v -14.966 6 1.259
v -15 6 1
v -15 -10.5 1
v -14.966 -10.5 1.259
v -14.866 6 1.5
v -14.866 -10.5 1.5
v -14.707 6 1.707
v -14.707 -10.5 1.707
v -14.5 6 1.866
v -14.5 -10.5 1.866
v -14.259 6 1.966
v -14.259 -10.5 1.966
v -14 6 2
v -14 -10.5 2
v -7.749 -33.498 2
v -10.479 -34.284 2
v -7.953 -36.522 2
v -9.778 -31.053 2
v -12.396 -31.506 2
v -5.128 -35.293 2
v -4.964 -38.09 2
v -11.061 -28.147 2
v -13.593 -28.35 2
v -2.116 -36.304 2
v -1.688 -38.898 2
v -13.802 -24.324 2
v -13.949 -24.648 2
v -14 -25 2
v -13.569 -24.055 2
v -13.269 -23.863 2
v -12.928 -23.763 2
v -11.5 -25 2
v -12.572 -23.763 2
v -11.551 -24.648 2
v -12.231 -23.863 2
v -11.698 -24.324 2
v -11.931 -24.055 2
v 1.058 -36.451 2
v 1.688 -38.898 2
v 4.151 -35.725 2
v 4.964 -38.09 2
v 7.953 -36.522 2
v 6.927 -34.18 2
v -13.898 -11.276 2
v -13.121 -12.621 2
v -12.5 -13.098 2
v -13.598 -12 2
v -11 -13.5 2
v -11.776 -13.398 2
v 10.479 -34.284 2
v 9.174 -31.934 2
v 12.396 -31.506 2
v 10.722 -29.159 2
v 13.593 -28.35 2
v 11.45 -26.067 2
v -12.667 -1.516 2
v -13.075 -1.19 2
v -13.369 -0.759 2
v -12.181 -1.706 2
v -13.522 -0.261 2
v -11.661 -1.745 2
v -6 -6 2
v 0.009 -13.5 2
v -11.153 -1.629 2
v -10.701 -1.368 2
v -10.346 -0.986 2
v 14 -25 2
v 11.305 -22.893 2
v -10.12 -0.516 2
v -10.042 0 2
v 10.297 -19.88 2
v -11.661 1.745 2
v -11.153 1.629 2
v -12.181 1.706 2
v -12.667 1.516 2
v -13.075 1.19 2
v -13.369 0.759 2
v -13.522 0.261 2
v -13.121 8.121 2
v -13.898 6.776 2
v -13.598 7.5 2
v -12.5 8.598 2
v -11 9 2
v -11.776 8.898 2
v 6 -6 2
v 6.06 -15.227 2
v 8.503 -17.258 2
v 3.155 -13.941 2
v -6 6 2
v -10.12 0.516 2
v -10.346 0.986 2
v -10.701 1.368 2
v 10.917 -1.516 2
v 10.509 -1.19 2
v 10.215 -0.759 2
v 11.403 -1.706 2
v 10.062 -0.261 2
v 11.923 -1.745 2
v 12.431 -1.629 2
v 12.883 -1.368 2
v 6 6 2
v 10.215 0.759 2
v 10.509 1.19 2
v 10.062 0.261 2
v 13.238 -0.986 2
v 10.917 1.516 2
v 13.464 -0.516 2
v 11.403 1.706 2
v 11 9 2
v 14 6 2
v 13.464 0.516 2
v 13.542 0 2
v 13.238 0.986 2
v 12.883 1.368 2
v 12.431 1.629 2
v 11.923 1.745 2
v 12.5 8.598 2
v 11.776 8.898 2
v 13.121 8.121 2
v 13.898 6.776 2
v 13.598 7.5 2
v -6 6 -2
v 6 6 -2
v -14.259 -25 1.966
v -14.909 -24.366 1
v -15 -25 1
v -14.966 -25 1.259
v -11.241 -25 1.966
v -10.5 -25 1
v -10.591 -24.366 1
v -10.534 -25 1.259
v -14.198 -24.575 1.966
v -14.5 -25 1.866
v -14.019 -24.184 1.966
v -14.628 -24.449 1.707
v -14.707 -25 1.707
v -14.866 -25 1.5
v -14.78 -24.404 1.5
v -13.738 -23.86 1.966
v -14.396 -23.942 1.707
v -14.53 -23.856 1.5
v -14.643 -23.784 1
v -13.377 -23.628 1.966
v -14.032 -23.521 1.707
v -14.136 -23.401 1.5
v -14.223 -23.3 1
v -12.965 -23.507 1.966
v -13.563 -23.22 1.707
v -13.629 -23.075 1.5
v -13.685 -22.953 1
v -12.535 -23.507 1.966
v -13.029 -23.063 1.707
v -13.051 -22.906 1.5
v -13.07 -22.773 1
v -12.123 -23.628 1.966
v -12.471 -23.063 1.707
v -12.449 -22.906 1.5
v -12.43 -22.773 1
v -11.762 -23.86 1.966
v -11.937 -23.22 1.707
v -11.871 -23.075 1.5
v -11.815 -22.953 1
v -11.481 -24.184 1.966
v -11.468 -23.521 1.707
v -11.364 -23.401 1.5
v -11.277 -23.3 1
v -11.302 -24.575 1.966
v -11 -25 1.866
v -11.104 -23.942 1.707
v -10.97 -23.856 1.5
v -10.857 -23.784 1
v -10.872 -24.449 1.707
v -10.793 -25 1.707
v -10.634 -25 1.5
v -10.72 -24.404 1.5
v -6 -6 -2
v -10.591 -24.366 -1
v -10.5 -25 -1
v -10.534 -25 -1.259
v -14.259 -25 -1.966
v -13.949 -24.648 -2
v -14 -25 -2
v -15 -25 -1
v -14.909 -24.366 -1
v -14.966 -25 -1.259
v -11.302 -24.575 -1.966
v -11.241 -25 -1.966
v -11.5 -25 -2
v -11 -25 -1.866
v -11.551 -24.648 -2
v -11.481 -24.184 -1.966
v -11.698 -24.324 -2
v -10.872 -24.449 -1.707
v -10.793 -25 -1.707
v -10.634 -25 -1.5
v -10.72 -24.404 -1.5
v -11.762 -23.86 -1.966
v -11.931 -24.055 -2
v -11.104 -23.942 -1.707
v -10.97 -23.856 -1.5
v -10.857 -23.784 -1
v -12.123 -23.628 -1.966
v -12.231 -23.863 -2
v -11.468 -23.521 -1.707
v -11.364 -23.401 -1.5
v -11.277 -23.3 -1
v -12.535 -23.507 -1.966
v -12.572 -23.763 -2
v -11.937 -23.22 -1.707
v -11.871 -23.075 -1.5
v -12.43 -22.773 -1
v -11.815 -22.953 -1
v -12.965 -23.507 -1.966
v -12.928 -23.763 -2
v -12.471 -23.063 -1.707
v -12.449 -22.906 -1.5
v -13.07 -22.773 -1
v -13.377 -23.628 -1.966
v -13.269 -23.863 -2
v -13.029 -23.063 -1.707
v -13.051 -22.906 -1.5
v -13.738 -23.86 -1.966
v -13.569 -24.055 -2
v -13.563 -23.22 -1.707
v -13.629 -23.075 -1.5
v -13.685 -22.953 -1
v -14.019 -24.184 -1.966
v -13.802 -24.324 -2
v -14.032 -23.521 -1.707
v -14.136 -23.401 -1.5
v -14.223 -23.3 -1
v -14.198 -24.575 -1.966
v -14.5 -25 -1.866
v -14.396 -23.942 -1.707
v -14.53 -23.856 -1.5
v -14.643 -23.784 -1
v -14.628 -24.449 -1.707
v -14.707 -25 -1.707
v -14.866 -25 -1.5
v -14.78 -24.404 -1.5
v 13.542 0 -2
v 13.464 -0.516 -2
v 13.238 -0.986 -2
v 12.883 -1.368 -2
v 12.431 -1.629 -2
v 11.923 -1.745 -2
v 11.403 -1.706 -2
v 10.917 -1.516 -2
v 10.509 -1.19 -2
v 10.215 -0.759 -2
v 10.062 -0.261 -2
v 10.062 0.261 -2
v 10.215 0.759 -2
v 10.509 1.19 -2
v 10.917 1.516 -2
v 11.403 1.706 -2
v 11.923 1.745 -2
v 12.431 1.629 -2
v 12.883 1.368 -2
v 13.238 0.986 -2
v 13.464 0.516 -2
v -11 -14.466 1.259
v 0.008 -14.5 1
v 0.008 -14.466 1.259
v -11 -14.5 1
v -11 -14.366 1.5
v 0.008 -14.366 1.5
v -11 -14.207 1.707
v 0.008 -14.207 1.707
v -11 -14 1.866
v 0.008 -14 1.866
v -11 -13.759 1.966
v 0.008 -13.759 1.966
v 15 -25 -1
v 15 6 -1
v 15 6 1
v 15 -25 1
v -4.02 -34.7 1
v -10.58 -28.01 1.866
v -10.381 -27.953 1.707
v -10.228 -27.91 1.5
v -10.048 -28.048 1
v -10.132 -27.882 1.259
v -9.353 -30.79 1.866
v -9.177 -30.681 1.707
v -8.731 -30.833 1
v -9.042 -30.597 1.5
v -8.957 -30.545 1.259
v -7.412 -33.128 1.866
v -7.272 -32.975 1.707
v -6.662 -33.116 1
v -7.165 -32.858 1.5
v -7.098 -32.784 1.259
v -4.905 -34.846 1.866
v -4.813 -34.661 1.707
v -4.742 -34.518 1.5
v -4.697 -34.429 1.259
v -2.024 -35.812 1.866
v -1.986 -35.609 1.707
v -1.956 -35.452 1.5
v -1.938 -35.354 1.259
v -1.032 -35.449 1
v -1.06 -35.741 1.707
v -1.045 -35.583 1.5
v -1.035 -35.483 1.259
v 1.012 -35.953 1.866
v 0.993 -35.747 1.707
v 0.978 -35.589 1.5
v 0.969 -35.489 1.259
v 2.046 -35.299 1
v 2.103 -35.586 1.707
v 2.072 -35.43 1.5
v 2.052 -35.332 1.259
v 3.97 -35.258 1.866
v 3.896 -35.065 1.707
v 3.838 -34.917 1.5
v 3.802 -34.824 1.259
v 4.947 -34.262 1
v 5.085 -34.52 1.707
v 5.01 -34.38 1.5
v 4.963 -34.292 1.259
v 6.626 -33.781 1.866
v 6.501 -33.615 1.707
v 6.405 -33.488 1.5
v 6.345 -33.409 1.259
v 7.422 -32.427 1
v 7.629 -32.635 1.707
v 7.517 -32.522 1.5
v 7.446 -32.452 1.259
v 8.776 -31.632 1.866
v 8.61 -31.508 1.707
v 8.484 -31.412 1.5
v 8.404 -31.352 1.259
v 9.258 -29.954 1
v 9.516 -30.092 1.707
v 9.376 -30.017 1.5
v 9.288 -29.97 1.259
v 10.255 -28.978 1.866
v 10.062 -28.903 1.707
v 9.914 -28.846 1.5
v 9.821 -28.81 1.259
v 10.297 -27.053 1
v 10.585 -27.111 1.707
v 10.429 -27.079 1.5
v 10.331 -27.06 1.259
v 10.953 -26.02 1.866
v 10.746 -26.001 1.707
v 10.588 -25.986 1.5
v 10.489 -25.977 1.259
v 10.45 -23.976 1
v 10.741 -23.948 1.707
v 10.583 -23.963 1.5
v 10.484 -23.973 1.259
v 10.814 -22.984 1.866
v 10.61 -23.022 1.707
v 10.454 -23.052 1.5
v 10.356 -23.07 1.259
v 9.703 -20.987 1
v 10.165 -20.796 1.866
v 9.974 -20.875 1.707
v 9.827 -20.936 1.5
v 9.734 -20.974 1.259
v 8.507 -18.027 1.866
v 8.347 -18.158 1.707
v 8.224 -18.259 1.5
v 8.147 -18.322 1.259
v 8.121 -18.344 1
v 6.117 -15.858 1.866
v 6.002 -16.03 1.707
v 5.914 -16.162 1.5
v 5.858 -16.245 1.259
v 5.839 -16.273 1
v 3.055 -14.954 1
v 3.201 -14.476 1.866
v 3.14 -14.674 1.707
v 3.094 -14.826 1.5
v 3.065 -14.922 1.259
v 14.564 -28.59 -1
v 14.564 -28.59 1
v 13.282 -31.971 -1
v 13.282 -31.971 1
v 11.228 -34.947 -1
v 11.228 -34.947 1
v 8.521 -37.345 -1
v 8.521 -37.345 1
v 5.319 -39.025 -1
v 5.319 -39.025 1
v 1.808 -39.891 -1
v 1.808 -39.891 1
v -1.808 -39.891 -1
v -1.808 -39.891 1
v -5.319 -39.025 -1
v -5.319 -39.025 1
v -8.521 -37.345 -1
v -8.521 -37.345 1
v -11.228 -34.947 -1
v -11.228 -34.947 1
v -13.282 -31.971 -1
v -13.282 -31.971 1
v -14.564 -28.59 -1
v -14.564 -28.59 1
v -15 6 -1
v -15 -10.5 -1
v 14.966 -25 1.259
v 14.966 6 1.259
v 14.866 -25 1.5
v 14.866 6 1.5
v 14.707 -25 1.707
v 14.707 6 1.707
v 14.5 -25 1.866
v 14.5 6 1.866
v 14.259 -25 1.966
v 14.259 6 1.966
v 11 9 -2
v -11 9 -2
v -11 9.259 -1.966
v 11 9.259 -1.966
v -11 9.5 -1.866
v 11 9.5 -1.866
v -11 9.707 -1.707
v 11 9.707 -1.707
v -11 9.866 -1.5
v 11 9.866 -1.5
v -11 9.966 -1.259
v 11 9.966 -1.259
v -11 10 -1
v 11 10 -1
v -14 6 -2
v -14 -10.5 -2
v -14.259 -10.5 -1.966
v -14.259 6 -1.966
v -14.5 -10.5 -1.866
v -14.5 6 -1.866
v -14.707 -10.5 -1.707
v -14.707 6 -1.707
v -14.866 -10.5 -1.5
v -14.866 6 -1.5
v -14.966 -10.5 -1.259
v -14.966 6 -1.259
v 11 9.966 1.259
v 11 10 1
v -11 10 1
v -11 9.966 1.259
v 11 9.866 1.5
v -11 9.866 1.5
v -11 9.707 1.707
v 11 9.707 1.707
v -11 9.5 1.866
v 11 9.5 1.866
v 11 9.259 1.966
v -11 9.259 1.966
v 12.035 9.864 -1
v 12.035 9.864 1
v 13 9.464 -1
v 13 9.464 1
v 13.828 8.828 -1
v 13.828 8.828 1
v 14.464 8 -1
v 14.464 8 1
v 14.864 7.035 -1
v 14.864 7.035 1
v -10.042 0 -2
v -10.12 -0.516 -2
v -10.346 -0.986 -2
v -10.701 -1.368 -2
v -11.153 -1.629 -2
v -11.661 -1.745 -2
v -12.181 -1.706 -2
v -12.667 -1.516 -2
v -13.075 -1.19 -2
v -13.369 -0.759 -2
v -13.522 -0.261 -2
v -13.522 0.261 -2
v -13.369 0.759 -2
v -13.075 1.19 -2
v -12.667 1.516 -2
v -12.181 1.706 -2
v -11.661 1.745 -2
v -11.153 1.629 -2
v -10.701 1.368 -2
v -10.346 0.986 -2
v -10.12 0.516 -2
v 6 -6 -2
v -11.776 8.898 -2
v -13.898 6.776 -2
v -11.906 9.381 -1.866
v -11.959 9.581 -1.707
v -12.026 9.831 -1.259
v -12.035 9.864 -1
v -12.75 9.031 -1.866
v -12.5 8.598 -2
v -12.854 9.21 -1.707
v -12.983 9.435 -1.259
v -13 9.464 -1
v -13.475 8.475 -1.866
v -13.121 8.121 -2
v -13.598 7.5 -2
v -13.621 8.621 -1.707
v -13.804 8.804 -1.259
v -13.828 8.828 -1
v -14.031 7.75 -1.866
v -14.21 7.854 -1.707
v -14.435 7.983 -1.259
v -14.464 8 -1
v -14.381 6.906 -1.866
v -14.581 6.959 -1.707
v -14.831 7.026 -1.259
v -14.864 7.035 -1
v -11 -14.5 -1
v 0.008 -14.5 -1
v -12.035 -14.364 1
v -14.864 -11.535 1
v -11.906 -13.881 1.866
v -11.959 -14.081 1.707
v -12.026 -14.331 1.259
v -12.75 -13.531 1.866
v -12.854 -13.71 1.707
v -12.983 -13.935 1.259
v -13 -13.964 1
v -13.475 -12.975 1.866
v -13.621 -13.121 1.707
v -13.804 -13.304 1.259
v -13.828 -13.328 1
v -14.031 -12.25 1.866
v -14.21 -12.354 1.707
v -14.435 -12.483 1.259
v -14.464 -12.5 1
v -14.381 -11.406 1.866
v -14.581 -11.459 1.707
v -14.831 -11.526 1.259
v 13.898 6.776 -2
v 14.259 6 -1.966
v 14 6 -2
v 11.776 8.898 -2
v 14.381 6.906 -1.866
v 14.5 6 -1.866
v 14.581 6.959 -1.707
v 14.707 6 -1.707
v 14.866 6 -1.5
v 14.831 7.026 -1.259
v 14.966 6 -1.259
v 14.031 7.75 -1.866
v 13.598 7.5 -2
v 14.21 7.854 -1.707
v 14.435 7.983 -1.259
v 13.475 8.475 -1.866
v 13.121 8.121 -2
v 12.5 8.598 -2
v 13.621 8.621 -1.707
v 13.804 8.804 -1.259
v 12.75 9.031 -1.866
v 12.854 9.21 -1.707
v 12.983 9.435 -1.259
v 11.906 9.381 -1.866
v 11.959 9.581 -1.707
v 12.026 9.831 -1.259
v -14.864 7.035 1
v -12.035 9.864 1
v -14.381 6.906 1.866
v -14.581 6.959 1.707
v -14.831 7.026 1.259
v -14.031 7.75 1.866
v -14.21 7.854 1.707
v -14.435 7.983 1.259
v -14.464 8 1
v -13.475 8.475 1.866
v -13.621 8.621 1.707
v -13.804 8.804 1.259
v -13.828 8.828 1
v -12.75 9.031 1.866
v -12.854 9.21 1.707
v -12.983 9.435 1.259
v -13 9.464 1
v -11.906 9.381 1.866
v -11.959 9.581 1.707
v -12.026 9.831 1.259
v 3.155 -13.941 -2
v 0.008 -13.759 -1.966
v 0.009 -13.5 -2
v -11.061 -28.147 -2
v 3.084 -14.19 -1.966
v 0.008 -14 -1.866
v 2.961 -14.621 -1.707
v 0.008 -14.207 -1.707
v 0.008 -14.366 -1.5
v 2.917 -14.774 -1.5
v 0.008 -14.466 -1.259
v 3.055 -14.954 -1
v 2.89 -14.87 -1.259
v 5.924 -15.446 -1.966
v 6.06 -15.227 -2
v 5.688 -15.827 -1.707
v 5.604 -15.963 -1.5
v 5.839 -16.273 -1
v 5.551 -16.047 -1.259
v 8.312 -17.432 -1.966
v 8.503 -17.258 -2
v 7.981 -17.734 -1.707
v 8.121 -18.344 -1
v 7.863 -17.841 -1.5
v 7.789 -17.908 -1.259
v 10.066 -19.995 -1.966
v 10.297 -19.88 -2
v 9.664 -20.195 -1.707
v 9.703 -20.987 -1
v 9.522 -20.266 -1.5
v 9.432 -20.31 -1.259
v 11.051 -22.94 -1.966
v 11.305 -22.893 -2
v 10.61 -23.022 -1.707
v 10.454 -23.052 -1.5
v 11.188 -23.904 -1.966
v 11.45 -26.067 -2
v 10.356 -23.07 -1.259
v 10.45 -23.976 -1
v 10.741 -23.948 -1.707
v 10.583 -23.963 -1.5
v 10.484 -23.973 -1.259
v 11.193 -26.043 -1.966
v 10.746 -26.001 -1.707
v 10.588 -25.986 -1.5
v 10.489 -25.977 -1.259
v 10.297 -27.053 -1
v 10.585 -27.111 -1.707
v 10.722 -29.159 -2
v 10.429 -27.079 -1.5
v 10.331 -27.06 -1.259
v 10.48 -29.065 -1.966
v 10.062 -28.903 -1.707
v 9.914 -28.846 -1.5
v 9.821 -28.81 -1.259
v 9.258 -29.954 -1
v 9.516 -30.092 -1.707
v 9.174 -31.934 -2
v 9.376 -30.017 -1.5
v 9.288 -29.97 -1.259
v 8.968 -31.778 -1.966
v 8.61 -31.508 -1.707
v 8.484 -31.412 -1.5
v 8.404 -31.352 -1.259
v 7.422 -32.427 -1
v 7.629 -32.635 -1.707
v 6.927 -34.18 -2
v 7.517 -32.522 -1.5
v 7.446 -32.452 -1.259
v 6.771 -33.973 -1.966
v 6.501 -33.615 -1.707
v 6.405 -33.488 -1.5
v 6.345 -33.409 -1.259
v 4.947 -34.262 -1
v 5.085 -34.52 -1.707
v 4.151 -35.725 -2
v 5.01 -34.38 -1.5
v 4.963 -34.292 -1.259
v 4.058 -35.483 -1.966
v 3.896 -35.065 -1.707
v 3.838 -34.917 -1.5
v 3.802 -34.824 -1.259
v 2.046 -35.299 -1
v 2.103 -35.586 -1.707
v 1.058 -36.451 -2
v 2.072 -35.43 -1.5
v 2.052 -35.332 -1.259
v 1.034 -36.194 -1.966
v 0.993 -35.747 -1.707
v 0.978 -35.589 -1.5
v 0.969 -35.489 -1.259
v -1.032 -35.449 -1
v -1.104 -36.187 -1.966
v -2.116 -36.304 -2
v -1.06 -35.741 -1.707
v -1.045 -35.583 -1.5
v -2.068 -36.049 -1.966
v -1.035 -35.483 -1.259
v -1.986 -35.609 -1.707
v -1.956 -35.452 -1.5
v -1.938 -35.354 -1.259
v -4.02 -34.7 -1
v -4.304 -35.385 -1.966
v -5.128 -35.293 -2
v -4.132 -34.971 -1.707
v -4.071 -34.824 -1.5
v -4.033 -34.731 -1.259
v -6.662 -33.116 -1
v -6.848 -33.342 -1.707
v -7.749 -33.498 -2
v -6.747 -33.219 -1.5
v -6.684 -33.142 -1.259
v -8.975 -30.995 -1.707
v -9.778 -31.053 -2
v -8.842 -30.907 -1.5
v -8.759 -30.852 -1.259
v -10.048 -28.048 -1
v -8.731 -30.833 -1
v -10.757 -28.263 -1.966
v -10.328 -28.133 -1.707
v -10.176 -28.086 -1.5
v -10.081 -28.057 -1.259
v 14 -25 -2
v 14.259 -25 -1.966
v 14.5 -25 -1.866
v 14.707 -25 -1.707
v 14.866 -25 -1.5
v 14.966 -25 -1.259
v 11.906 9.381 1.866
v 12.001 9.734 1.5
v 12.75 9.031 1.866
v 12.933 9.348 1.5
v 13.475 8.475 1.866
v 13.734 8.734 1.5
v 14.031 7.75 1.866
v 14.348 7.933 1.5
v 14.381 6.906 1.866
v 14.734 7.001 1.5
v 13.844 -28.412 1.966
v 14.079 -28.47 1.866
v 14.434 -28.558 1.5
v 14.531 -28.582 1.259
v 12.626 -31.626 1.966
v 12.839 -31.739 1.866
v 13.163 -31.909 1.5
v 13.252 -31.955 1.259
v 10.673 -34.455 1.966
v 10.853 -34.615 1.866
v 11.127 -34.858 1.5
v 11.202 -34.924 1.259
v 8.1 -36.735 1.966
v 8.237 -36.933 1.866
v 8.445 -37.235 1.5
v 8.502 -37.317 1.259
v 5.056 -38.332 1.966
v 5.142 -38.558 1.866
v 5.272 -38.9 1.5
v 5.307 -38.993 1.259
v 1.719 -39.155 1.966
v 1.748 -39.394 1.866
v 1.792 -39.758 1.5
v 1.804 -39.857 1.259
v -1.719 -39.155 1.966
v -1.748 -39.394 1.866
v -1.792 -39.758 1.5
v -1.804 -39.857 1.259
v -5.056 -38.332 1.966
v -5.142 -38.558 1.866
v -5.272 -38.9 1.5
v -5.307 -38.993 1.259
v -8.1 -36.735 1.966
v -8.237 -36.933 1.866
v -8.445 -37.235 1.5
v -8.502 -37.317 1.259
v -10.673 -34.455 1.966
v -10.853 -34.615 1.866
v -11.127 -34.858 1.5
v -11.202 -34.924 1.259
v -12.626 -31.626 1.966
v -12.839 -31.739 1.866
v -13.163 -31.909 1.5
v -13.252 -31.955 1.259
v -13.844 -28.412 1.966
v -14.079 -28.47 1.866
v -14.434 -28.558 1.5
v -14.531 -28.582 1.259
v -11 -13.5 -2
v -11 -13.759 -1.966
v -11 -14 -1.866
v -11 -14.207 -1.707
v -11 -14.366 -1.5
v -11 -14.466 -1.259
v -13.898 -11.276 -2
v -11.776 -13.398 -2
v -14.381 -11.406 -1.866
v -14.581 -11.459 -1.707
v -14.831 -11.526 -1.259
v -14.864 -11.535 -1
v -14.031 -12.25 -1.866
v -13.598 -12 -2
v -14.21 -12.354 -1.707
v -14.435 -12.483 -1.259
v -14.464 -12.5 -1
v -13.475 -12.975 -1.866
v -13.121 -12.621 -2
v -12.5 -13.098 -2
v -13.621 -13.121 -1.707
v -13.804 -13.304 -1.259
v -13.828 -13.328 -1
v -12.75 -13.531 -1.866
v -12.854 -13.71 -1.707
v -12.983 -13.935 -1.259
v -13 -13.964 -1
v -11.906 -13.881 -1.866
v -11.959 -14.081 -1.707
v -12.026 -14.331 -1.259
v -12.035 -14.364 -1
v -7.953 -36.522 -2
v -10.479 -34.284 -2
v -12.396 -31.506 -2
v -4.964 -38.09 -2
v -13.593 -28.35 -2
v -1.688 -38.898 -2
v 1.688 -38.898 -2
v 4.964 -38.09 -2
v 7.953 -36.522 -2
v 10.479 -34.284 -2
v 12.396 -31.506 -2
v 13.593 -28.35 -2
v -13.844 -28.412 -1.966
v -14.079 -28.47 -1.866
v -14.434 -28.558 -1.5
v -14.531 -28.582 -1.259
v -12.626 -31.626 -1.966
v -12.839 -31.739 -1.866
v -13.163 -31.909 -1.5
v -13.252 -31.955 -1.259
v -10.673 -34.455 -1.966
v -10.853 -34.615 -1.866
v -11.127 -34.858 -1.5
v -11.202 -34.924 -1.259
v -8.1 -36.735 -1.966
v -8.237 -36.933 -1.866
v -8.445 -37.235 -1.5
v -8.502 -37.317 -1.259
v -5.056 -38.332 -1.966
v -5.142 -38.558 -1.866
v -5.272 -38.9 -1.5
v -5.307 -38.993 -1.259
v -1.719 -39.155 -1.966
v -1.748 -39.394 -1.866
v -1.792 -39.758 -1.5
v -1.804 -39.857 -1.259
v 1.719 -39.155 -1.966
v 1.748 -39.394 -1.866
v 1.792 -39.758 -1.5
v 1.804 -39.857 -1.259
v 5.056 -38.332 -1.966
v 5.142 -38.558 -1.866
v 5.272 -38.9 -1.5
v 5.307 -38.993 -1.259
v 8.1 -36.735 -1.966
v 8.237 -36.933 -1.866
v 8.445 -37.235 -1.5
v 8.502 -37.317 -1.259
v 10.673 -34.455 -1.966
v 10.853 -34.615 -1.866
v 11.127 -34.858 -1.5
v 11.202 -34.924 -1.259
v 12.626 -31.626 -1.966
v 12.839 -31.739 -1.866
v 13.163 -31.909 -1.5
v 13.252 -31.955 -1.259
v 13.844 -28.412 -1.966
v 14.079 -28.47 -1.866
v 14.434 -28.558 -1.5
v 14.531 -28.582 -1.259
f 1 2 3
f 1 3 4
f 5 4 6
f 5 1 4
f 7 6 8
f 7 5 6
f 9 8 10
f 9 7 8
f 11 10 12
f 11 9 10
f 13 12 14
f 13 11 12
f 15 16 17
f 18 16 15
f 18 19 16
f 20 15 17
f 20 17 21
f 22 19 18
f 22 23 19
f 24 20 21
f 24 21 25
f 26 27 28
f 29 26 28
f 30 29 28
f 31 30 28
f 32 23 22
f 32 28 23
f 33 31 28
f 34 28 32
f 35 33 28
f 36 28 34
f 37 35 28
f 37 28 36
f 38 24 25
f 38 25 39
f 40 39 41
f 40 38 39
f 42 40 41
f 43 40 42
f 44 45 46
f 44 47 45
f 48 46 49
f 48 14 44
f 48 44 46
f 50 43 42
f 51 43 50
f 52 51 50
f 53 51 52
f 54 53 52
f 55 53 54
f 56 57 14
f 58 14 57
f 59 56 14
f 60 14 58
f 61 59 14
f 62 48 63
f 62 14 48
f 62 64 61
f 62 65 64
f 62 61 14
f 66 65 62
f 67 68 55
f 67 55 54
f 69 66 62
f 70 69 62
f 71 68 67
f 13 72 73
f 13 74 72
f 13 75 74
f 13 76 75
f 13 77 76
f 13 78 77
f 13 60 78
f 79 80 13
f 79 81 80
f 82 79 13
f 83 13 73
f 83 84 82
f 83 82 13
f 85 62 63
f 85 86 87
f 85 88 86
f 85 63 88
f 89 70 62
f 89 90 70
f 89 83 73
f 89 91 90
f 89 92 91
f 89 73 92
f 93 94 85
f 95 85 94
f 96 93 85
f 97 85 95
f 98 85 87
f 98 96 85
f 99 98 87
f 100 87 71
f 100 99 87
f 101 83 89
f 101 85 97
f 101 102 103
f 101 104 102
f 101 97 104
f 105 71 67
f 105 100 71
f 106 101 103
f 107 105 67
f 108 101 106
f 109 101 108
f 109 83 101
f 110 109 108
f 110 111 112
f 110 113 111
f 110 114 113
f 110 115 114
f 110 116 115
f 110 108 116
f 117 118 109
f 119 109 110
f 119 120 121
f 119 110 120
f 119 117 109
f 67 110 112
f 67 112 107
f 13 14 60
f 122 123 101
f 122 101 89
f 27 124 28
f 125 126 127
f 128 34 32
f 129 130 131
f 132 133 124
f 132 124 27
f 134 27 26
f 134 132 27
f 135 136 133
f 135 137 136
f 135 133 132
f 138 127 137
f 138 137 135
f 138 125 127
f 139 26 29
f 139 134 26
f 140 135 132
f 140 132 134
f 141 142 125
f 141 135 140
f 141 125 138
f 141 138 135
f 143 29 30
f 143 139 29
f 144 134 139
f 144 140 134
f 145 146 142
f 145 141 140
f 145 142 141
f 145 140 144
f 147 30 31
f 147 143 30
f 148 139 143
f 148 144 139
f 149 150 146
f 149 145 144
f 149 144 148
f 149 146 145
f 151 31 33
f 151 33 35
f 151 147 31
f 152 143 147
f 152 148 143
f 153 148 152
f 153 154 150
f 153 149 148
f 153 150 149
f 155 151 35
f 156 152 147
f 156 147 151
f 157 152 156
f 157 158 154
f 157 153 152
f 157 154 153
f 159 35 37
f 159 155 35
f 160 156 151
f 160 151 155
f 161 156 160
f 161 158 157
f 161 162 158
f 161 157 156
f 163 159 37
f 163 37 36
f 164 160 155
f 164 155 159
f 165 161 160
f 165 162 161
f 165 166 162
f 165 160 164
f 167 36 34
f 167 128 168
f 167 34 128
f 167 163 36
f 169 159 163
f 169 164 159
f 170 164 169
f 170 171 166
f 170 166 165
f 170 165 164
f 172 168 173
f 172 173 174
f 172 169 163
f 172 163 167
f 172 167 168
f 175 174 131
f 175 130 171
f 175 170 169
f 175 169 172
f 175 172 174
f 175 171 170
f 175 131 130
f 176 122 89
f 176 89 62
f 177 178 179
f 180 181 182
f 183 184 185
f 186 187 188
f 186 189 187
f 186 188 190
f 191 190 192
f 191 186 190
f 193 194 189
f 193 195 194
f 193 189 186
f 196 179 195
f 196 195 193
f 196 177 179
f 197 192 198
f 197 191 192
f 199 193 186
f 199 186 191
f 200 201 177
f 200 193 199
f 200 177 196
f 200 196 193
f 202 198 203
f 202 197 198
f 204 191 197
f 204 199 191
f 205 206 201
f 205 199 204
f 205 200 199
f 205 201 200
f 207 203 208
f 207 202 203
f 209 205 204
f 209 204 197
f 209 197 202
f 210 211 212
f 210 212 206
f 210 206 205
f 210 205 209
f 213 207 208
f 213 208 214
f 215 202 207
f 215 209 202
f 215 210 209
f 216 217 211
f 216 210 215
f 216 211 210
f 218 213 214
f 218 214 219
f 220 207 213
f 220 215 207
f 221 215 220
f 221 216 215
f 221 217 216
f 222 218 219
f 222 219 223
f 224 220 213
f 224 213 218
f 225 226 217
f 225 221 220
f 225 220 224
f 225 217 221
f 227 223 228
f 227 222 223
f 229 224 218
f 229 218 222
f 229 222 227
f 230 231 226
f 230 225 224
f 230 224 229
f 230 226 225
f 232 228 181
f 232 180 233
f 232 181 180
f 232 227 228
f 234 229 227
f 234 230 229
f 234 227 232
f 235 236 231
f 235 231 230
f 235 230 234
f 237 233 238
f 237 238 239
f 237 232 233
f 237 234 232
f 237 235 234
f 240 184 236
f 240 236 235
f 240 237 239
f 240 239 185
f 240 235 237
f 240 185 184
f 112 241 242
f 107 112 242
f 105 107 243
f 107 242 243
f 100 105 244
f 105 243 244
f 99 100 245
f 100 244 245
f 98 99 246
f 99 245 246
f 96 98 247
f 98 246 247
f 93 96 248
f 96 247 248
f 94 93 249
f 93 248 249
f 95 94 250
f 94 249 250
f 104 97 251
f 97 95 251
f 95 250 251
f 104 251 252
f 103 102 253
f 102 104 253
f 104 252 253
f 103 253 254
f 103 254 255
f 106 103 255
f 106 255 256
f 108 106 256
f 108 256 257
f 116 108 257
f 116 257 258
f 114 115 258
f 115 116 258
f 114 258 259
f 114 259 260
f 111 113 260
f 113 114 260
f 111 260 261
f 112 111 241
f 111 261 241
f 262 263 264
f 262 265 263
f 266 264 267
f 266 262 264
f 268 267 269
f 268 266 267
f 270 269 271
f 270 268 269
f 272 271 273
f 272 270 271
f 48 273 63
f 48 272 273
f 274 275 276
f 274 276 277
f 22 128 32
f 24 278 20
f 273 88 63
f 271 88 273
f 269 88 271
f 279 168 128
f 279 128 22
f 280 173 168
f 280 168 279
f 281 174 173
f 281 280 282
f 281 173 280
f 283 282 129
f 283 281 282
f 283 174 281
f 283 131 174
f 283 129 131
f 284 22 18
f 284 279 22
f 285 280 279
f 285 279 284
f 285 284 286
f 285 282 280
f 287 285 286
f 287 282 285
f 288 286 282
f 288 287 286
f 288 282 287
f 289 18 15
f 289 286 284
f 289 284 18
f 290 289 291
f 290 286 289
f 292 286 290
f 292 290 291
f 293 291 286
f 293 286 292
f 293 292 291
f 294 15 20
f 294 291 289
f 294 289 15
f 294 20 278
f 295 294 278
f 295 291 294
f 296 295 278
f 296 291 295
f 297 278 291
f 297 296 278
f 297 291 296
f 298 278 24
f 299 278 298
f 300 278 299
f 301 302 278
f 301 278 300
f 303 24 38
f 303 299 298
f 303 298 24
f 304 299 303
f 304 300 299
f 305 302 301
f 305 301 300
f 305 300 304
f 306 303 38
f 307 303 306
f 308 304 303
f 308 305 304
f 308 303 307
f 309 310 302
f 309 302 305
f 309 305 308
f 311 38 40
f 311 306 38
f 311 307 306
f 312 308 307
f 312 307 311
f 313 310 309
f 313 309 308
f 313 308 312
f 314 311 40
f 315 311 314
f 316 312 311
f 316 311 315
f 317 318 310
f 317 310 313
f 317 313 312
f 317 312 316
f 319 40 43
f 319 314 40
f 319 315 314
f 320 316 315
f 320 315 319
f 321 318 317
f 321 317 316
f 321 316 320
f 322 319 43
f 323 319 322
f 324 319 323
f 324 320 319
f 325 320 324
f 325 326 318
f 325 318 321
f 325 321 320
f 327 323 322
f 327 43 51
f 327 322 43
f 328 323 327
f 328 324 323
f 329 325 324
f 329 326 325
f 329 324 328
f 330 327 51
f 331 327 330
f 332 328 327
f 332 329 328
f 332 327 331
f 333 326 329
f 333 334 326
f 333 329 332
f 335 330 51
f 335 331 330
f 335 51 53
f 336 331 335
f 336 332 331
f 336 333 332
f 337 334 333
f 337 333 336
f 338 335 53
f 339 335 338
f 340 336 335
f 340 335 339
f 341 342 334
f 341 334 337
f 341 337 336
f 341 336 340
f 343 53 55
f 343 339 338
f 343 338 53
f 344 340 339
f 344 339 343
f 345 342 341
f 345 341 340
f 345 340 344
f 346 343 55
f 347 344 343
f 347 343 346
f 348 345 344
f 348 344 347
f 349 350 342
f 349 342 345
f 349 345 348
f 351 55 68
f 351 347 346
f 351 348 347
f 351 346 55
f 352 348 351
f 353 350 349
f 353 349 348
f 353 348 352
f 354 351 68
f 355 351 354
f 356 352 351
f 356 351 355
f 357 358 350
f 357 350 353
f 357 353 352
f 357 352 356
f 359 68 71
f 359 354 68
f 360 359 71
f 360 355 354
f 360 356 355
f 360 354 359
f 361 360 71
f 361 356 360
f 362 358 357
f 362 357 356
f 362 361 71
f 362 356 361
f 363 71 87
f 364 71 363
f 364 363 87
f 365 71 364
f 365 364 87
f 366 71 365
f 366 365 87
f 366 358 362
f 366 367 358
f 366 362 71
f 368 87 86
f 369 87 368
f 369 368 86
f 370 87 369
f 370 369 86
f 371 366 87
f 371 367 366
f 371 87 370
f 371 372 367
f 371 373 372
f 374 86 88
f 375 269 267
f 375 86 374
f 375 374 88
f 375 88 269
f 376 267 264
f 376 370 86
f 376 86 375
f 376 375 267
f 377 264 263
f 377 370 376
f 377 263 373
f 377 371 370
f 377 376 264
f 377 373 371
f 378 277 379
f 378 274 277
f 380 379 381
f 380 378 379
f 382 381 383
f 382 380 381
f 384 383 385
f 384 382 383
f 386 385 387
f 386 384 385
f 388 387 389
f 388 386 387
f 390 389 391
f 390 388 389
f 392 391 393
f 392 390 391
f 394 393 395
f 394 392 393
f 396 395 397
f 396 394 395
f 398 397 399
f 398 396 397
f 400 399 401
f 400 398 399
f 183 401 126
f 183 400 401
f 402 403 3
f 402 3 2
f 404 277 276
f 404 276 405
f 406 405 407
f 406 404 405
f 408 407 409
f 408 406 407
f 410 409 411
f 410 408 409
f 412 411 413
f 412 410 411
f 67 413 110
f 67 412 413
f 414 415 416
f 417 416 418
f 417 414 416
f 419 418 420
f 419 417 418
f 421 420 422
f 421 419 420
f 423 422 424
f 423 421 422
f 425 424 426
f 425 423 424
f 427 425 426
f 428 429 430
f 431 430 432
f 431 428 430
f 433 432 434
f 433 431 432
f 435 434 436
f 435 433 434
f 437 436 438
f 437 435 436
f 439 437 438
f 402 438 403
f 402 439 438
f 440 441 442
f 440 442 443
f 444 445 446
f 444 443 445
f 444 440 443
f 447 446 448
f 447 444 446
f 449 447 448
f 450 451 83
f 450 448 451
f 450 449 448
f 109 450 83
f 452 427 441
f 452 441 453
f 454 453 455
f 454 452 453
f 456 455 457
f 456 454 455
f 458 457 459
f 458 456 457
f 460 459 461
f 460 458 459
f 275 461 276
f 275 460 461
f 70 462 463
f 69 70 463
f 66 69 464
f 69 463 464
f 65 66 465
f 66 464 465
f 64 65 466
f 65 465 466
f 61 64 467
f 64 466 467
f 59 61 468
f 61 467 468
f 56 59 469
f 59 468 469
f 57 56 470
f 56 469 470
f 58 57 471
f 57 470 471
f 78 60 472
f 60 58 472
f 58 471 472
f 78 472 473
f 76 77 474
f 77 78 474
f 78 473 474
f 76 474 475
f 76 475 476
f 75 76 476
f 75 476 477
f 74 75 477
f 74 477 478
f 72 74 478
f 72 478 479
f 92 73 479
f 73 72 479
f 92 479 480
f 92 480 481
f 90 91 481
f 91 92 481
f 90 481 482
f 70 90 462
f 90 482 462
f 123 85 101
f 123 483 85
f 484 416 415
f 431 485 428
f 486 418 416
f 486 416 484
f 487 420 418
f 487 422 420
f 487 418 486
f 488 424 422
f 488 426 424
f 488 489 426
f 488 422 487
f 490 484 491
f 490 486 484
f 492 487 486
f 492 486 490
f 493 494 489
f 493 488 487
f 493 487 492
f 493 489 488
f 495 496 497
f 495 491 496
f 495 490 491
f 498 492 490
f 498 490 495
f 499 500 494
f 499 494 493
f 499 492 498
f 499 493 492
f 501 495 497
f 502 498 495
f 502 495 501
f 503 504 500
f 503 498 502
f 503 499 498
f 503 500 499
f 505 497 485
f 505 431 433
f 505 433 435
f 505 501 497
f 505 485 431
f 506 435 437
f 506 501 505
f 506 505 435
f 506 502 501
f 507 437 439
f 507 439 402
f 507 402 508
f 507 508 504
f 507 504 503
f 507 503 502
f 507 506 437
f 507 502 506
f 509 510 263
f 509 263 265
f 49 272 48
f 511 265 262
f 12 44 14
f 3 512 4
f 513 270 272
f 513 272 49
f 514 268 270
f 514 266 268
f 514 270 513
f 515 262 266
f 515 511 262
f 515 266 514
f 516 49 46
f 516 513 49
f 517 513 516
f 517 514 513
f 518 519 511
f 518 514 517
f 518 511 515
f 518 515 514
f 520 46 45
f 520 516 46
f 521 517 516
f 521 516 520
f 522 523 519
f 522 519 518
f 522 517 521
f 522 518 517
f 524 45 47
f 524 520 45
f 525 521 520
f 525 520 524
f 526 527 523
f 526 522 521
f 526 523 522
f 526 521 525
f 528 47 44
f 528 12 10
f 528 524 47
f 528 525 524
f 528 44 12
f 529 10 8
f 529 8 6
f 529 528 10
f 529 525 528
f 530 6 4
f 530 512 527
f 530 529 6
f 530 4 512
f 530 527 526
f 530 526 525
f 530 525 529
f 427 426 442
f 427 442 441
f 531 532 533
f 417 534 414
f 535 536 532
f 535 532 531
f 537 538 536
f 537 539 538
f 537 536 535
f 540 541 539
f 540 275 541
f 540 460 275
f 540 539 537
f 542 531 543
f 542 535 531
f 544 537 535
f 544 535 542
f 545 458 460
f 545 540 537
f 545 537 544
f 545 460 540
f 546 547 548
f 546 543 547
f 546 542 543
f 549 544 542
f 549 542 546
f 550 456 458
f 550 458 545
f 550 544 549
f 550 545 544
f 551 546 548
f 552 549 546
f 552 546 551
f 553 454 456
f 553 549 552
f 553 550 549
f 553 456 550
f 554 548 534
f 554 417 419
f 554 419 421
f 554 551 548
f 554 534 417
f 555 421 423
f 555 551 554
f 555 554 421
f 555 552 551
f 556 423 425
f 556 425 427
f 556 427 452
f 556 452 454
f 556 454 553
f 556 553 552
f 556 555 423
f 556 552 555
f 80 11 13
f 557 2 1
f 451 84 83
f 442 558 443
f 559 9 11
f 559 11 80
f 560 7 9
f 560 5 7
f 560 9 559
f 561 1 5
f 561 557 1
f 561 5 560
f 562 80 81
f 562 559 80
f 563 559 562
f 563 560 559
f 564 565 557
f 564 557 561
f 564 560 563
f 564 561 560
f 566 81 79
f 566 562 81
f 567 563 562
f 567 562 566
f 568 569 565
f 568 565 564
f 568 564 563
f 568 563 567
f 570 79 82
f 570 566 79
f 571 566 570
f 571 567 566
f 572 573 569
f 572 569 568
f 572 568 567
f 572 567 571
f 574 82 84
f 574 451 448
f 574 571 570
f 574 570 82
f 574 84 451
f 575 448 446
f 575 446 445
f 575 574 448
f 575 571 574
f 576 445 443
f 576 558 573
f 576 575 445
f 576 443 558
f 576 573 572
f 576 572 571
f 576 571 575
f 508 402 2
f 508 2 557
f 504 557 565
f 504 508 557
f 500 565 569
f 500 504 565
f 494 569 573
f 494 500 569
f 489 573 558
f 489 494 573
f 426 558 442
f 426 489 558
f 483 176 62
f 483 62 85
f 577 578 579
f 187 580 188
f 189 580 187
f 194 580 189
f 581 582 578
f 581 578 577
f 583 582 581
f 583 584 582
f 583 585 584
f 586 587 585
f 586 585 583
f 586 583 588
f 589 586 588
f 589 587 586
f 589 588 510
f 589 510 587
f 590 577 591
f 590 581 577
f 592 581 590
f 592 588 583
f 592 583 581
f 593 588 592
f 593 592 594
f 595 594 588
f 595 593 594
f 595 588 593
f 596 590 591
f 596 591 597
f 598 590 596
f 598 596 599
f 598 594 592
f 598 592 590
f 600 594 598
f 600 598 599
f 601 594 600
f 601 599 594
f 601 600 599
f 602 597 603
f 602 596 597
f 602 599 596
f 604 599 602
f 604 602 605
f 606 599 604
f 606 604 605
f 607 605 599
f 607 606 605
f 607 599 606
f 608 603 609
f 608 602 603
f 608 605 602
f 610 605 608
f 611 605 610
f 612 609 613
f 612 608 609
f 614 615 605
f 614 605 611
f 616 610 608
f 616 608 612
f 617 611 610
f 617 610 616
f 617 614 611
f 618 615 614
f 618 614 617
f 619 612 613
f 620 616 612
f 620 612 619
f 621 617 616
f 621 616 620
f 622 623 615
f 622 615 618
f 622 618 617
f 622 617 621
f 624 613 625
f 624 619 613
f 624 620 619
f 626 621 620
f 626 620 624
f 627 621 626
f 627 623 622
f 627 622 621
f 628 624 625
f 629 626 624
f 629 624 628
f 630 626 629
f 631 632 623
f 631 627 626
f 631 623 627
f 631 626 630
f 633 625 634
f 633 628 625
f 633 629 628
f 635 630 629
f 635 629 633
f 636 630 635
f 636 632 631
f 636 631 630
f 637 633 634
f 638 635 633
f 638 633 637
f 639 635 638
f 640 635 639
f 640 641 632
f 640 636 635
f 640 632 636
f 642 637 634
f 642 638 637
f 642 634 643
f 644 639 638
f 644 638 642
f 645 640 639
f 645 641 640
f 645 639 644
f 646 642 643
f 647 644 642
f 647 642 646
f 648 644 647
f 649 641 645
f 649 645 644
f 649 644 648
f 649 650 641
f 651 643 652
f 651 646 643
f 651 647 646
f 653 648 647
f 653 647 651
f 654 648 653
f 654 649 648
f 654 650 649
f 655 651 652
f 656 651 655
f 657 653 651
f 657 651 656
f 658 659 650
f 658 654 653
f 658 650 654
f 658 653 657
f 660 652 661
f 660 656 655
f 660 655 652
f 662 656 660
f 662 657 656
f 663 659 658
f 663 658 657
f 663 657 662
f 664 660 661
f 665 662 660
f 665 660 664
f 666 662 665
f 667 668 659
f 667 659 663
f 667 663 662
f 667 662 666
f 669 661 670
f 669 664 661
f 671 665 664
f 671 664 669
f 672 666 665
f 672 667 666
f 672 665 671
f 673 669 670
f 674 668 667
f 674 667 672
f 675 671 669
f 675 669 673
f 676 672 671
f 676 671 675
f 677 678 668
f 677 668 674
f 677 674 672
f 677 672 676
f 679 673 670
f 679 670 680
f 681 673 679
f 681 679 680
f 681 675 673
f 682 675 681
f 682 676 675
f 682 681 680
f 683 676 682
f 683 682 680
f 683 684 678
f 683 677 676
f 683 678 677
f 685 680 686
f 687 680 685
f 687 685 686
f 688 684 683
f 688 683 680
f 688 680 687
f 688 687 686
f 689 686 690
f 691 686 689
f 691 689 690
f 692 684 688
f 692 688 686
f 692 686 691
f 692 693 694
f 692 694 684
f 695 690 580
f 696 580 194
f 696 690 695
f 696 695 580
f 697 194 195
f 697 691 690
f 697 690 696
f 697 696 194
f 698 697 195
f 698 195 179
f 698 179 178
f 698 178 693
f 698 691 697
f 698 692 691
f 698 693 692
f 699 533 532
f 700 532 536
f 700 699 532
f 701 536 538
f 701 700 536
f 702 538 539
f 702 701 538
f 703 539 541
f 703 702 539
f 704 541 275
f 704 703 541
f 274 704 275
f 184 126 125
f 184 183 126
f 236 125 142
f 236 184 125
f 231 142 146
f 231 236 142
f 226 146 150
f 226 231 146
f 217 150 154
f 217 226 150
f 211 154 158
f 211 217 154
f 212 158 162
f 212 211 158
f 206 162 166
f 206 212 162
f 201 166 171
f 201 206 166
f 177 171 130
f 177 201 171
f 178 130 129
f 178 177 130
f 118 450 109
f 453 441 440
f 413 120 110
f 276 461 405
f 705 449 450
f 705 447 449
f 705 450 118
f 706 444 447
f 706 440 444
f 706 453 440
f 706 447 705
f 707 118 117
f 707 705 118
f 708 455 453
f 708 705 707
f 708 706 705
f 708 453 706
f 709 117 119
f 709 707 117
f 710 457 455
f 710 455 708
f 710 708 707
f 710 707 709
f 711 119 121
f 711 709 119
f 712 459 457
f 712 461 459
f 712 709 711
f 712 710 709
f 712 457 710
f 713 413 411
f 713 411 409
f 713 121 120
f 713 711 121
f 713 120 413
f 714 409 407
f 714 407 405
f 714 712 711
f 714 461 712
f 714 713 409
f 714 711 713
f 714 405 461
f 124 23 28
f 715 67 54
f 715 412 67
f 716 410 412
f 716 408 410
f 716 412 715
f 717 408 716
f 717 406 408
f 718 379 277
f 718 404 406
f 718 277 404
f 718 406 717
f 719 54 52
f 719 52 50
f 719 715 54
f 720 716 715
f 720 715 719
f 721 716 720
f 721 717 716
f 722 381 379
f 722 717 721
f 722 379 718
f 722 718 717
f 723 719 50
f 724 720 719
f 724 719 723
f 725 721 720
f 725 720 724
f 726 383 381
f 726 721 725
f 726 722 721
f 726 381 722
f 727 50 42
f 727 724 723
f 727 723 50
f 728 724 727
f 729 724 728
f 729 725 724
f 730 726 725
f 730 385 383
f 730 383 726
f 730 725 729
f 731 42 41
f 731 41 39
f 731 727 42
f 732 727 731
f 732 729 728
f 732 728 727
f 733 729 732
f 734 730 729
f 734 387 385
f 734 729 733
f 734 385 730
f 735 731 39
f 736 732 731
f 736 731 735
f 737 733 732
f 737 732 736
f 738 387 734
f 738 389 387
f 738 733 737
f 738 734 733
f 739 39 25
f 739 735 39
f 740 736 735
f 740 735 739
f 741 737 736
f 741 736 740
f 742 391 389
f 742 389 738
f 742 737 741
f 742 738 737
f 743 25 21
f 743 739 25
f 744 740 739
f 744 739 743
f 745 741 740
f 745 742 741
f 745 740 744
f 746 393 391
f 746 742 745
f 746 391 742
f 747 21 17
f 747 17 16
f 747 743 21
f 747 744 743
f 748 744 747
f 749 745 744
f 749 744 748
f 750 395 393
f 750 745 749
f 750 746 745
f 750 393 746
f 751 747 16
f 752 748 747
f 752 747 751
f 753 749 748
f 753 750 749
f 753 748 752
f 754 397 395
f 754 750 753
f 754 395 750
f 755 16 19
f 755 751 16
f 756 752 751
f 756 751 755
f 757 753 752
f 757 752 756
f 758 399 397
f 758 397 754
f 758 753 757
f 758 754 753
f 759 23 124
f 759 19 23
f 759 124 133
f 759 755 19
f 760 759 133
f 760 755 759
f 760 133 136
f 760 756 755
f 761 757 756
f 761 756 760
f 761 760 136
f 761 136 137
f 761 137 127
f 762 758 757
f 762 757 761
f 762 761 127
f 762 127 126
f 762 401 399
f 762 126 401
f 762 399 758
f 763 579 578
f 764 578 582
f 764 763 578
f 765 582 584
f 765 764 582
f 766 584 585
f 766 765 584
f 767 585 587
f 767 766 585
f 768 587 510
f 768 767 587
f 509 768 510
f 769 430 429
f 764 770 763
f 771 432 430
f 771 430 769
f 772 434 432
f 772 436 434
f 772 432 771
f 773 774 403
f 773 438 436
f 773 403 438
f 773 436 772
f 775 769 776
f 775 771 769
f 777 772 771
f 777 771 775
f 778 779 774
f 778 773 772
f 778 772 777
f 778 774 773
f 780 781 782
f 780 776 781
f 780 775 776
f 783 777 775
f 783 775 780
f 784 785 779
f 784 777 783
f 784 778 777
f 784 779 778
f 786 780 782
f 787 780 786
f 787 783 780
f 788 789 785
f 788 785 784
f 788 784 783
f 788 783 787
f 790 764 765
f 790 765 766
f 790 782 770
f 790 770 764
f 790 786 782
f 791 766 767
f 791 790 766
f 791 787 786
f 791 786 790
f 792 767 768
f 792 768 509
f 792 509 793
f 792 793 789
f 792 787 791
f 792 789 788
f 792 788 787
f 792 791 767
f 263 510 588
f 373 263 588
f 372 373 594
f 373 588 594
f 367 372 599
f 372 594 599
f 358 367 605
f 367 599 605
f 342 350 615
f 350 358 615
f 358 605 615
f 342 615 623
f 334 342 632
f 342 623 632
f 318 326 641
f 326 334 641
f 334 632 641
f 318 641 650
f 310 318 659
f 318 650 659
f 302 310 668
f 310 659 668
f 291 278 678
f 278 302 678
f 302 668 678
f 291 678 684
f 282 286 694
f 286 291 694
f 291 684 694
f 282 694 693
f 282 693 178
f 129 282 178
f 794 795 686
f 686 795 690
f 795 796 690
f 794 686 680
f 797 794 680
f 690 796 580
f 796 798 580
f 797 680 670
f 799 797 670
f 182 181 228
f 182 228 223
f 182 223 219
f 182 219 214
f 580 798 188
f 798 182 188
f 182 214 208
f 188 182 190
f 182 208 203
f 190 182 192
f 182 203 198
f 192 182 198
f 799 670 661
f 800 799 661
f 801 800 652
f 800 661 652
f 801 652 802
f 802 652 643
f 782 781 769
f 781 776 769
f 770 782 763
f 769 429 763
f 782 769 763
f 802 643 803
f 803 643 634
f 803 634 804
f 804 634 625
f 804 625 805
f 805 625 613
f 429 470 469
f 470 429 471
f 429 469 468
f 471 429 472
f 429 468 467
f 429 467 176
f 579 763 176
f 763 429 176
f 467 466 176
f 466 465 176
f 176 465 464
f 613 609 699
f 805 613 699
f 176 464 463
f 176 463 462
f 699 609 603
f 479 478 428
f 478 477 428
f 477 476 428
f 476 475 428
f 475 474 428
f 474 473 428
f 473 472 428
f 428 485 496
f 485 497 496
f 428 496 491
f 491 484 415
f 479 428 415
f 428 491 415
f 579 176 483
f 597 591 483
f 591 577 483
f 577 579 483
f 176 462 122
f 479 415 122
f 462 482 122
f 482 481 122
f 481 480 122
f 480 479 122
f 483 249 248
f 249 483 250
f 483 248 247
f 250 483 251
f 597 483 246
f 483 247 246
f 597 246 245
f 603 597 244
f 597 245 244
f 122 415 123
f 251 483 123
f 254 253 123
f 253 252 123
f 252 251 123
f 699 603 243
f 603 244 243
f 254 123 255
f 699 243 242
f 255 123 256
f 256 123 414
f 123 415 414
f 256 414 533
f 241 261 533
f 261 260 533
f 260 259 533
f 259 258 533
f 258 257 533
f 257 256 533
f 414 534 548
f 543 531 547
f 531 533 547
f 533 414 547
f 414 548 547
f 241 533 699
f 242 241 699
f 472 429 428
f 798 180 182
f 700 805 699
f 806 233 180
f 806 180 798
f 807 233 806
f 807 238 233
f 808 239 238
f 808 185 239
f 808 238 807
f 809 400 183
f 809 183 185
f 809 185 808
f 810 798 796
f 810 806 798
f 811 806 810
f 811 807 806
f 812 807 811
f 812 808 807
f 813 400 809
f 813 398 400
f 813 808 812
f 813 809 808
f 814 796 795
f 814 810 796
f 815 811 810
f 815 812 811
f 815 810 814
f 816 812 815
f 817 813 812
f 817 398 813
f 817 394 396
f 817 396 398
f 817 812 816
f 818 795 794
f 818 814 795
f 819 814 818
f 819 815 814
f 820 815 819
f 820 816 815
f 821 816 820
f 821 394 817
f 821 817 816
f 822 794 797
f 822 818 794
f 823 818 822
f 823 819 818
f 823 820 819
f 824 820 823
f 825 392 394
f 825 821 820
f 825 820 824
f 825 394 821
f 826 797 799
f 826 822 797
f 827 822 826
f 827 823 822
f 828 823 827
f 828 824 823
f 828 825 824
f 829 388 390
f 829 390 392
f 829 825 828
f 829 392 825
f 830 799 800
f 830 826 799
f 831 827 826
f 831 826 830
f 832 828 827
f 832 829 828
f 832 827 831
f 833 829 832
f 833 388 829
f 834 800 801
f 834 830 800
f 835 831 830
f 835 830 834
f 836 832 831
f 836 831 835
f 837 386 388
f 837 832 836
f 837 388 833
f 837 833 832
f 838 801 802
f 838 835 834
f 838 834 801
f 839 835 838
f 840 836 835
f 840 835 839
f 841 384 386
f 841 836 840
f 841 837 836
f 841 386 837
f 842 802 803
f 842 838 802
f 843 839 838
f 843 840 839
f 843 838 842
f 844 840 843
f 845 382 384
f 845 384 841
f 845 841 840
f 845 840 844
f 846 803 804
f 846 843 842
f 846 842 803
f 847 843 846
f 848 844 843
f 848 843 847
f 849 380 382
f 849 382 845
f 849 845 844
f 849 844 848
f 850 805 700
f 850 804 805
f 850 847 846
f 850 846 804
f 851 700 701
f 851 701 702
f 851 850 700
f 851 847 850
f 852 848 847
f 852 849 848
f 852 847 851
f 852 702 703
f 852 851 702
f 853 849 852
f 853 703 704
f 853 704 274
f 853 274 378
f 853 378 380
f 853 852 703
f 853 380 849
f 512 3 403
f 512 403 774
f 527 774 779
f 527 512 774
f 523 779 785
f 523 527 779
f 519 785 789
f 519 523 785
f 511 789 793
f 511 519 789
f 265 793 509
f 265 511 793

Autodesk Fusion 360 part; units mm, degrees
sketch "Sketch1" plane through (0, 0, 0) normal (0, 0, 1) x (1, 0, 0)
  line L0 (-15, -10) -> (-15, 10)
  line L1 (-15, 10) -> (15, 10)
  line L2 (15, 10) -> (15, -10)
  line L3 (15, -10) -> (-15, 10) construction
  line L4 (-15, -10) -> (15, 10) construction
  line L5 (15, -10) -> (15, -25)
  line L6 (0.0079, -14.5) -> (-15, -14.5)
  line L7 (-15, -10) -> (-15, -14.5)
  arc A0 (-10.5, -25) -> (-0.0079, -14.5) centre (0, -25) ccw
  arc A1 (-15, -25) -> (-10.7121, -14.5) centre (0, -25) ccw
  arc A2 (-10.5, -25) -> (-15, -25) centre (-12.75, -25) ccw
  line L8 (6, 6) -> (-6, 6)
  line L9 (-6, 6) -> (-6, -6)
  line L10 (-6, -6) -> (6, -6)
  line L11 (6, -6) -> (6, 6)
  line L12 (6, 6) -> (-6, -6) construction
  line L13 (-6, 6) -> (6, -6) construction
  circle A3 centre (-11.792, 0) radius 1.75
  circle A4 centre (11.792, 0) radius 1.75
  dimension "d1" = 30
  dimension "d3" = 12
  dimension "d4" = 12
  dimension "d5" = 3.5
extrude "Extrude1" add sketch "Sketch1" along normal mid plane 4 contours L0 L1 L2 L5 L6 L7 A1
extrude "Extrude2" add sketch "Sketch1" along normal mid plane 4 contours L6 A0 A1 A2
fillet "Fillet1" radius 4 2 edges at (-15, 10, 0) (15, 10, 0)
fillet "Fillet2" radius 4 1 edges at (-15, -14.5, 0)
fillet "Fillet3" radius 1 20 edges at (13.8284, 8.8284, 2) (0, 10, 2) (-13.8284, 8.8284, 2) (-15, -2.25, 2) (-13.8284, -13.3284, 2) (-5.5039, -14.5, 2) (7.4274, -32.4218, 2) (-12.75, -22.75, 2) (0, -40, 2) (15, -9.5, 2) (7.4274, -32.4218, -2) (-5.5039, -14.5, -2) (-13.8284, -13.3284, -2) (-15, -2.25, -2) (-13.8284, 8.8284, -2) (0, 10, -2) (13.8284, 8.8284, -2) (15, -9.5, -2) (0, -40, -2) (-12.75, -22.75, -2)
